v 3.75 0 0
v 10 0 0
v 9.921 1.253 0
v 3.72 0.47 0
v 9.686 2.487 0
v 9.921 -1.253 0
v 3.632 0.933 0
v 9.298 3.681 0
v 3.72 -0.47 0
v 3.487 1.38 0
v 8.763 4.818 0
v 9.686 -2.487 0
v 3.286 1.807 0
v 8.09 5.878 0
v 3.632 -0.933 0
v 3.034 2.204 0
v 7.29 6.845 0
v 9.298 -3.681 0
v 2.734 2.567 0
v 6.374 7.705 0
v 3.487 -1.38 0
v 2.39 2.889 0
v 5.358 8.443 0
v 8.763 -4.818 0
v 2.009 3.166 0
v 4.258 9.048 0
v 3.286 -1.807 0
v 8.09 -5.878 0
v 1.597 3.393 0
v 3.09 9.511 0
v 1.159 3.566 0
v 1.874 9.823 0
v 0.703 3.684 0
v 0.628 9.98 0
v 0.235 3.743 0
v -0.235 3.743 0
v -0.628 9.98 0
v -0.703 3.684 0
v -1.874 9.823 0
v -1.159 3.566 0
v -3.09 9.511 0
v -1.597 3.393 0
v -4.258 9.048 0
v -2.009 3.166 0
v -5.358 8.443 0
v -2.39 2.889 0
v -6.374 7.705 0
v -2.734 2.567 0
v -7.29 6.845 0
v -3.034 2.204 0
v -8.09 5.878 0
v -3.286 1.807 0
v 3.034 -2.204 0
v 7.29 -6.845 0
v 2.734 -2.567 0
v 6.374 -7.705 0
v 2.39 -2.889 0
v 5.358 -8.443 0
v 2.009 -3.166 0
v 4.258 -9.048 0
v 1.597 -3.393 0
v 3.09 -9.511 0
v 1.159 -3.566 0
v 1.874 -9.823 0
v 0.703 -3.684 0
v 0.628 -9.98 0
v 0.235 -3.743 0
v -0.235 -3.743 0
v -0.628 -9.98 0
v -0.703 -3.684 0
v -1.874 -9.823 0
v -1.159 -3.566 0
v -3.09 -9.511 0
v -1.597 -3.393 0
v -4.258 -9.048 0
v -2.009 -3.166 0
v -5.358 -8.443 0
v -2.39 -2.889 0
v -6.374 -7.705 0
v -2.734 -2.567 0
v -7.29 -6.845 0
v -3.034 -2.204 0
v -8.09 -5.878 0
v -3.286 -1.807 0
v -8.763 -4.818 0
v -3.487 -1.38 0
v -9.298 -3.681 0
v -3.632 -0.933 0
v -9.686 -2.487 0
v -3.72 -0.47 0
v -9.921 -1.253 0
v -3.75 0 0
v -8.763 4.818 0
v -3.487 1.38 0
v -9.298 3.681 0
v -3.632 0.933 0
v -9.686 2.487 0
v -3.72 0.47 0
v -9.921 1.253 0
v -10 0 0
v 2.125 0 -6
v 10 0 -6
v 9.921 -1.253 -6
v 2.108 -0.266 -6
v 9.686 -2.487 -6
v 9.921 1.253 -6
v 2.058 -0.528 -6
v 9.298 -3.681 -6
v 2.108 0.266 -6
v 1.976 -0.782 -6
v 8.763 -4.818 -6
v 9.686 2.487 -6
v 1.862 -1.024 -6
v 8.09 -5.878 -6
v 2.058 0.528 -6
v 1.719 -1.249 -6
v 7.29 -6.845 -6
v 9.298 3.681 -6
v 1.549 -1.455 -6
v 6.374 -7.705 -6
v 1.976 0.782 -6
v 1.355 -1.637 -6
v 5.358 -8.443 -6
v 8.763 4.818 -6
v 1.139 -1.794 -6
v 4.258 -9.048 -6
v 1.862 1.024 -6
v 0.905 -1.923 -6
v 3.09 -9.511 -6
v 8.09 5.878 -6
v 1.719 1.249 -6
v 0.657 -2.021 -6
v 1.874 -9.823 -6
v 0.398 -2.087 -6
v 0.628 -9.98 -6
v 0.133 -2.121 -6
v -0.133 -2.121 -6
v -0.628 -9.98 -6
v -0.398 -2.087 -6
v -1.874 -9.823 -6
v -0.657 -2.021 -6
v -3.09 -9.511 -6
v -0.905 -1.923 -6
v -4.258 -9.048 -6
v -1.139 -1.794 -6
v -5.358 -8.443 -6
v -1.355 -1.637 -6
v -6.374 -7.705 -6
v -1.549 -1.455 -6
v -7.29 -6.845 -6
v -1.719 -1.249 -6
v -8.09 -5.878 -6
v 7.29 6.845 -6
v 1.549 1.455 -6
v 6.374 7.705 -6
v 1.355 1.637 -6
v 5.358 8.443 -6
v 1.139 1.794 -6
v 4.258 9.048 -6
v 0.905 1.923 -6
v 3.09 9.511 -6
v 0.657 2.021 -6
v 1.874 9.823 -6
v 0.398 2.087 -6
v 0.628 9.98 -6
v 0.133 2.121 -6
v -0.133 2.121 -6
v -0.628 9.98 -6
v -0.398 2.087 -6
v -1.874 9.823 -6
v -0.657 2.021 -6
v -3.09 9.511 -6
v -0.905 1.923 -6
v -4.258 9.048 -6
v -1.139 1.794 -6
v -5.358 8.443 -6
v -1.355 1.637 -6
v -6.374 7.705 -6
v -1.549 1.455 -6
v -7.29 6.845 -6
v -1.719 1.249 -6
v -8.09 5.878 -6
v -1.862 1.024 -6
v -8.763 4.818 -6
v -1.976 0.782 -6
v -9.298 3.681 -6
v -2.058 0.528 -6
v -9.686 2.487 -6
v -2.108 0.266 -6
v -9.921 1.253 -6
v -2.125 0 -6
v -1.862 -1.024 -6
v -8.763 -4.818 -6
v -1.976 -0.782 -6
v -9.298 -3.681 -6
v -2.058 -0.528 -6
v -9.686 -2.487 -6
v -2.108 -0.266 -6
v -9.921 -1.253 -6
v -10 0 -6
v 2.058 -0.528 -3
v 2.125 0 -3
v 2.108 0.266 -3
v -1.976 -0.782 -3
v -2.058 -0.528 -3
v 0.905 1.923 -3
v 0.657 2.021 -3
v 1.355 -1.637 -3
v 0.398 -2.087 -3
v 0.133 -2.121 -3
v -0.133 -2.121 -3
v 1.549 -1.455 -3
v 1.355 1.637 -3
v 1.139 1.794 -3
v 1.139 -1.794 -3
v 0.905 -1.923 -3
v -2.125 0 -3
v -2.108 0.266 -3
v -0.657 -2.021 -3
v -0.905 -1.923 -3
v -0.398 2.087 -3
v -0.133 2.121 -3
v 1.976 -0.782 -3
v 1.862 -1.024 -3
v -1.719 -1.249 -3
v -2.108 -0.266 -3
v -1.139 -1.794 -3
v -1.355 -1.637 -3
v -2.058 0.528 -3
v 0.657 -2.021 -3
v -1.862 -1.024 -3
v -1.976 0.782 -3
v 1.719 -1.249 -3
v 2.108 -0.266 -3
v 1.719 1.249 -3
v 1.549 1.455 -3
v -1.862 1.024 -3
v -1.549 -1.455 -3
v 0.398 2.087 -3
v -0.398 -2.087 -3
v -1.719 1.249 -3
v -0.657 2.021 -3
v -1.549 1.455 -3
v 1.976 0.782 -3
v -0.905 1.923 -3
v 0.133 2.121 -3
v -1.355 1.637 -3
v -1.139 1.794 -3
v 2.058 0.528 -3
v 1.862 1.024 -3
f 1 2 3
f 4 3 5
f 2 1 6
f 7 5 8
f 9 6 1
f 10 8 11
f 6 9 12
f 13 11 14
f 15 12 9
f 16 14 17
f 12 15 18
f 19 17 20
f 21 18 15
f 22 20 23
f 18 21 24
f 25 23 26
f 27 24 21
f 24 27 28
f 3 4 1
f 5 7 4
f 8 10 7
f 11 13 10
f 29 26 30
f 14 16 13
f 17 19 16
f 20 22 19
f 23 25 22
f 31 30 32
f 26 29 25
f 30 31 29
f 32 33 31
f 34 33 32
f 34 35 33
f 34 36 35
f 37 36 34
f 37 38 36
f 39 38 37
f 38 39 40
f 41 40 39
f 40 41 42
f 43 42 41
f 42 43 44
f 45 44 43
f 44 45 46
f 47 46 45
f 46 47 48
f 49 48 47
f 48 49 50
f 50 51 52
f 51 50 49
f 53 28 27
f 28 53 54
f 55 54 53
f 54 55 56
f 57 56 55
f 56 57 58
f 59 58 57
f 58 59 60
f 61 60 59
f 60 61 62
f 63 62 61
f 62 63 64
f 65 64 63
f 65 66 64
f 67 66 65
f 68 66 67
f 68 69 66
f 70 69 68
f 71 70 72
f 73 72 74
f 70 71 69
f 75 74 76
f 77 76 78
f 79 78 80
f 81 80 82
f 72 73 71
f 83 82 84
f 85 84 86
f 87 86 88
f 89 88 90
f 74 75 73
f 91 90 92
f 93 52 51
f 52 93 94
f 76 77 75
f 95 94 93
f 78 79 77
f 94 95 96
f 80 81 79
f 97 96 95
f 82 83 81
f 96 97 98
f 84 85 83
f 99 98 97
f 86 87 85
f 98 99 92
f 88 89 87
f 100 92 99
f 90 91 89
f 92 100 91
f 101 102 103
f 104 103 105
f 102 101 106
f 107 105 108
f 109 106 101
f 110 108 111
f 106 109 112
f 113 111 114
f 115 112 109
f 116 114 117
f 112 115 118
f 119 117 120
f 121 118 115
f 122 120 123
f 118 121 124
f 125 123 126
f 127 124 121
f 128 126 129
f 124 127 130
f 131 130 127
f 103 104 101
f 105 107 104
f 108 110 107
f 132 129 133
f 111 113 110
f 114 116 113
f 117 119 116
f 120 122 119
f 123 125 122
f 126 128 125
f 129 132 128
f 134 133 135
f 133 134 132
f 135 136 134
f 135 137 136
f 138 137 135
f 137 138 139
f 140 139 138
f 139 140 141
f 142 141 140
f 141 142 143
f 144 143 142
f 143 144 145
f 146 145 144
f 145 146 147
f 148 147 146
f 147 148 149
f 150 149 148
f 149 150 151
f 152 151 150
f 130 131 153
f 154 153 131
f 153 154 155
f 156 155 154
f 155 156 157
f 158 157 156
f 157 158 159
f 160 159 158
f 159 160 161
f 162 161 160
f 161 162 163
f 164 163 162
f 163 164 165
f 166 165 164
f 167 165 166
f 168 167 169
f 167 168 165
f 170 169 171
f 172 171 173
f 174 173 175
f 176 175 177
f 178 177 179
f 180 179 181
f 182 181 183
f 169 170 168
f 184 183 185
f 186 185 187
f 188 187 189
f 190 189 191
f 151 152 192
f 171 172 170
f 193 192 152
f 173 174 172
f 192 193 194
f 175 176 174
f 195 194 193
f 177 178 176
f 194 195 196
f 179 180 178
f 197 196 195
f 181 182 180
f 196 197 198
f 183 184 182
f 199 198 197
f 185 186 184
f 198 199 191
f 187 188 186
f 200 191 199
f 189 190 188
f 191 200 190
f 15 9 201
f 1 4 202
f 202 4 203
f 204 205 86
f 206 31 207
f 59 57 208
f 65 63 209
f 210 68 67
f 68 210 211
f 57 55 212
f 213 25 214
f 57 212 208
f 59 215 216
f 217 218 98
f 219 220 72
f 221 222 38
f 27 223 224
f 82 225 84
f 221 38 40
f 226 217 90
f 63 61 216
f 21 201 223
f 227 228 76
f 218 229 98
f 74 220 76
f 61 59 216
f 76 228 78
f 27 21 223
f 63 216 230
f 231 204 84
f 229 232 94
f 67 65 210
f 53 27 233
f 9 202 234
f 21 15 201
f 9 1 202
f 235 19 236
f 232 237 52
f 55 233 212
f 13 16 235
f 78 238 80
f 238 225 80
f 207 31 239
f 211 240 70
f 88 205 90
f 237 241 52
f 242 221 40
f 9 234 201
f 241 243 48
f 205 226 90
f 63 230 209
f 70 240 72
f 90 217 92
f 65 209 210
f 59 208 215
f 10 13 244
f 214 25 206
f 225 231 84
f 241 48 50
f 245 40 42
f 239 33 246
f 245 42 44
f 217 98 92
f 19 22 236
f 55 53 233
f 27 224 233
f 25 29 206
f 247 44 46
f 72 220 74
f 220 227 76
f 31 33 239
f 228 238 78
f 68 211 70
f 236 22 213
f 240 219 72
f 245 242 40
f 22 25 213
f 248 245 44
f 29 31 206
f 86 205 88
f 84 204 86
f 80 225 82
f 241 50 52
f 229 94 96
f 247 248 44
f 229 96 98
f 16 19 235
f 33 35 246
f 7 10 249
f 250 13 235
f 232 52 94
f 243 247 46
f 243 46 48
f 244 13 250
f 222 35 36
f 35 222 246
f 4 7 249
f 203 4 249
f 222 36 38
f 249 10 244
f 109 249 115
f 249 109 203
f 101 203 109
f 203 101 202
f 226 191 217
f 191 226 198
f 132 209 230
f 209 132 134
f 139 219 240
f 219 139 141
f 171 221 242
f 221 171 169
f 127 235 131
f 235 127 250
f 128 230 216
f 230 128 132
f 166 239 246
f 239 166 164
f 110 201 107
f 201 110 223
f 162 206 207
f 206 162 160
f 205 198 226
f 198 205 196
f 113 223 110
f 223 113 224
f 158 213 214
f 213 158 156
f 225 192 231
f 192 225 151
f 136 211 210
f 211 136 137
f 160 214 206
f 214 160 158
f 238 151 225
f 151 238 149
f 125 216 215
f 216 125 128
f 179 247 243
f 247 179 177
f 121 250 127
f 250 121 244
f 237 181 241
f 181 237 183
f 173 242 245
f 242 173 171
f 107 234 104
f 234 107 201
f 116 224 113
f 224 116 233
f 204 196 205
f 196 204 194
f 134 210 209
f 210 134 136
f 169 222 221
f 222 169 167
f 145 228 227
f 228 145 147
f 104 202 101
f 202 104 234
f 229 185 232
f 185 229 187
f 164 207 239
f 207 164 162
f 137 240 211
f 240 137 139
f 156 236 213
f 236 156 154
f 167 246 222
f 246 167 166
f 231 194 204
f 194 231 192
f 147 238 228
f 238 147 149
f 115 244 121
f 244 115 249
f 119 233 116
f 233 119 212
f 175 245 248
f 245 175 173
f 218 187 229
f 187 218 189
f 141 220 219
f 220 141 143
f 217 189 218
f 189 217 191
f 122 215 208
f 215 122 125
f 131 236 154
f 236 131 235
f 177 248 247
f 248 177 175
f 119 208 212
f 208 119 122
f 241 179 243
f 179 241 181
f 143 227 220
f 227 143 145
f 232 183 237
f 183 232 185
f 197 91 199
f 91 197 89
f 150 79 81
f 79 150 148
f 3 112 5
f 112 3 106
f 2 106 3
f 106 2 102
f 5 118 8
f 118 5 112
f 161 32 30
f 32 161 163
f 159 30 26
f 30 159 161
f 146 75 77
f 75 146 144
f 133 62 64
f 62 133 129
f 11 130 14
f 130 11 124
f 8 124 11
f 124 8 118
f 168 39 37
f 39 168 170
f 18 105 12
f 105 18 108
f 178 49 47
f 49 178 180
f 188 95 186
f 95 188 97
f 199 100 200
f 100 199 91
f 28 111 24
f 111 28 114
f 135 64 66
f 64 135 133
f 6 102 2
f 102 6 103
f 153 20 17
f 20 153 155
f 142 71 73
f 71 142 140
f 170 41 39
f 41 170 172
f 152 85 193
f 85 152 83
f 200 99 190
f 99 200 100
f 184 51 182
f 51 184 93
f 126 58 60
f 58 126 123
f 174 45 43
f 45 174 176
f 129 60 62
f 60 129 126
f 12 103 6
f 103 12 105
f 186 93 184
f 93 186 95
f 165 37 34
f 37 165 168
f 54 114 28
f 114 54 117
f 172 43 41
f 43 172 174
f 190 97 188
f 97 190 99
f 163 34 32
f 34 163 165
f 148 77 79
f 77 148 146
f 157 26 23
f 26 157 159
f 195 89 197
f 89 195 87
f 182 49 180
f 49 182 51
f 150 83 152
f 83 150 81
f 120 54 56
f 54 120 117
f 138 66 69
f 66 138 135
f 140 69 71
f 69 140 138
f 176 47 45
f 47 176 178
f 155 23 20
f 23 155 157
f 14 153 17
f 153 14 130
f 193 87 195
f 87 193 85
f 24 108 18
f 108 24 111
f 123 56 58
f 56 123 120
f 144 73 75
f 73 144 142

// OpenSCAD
$fn = 50;


difference() {
	union() {
		translate(v = [0, 0, -6.0000000000]) {
			cylinder(h = 6, r = 10.0000000000);
		}
		cylinder(h = 0, r = 19.0000000000);
	}
	union() {
		translate(v = [0, 0, 0]) {
			rotate(a = [0, 0, 0]) {
				difference() {
					union() {
						#translate(v = [0, 0, -6.0000000000]) {
							cylinder(h = 6, r = 2.0000000000);
						}
						#translate(v = [0, 0, -3]) {
							cylinder(h = 3, r1 = 2.1250000000, r2 = 3.7500000000);
						}
						#translate(v = [0, 0, -6.0000000000]) {
							cylinder(h = 6, r = 2.1250000000);
						}
						#translate(v = [0, 0, -6.0000000000]) {
							cylinder(h = 6, r = 2.0000000000);
						}
					}
					union();
				}
			}
		}
	}
}
